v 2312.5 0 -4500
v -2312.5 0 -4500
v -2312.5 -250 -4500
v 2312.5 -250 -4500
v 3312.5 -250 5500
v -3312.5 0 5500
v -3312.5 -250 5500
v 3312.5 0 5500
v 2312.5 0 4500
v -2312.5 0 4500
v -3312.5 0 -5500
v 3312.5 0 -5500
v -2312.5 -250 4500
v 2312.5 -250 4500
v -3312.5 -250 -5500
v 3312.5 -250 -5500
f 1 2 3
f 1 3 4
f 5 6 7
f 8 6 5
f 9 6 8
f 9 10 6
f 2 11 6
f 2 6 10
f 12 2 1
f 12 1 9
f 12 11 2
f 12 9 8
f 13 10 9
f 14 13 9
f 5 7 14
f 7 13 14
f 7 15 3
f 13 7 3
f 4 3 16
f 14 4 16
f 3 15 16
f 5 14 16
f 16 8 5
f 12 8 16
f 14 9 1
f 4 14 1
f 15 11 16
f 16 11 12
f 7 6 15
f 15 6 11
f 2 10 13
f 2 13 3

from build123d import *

# Parameters (mm, degrees)
SKETCH_1_W      = 6625
SKETCH_1_H      = 11000
SKETCH_1_W_2    = 4625
SKETCH_1_H_2    = 9000
EXTRUDE_1_DEPTH = 250


with BuildPart() as part:
    # Эскиз1 → Бобышка-Вытянуть1 (new body)
    with BuildSketch(Plane(origin=(0, 0, 0), x_dir=(1, 0, 0), z_dir=(0, 1, 0))):
        Rectangle(SKETCH_1_W, SKETCH_1_H)
        Rectangle(SKETCH_1_W_2, SKETCH_1_H_2, mode=Mode.SUBTRACT)
    extrude(amount=-EXTRUDE_1_DEPTH)


solid = part.part
